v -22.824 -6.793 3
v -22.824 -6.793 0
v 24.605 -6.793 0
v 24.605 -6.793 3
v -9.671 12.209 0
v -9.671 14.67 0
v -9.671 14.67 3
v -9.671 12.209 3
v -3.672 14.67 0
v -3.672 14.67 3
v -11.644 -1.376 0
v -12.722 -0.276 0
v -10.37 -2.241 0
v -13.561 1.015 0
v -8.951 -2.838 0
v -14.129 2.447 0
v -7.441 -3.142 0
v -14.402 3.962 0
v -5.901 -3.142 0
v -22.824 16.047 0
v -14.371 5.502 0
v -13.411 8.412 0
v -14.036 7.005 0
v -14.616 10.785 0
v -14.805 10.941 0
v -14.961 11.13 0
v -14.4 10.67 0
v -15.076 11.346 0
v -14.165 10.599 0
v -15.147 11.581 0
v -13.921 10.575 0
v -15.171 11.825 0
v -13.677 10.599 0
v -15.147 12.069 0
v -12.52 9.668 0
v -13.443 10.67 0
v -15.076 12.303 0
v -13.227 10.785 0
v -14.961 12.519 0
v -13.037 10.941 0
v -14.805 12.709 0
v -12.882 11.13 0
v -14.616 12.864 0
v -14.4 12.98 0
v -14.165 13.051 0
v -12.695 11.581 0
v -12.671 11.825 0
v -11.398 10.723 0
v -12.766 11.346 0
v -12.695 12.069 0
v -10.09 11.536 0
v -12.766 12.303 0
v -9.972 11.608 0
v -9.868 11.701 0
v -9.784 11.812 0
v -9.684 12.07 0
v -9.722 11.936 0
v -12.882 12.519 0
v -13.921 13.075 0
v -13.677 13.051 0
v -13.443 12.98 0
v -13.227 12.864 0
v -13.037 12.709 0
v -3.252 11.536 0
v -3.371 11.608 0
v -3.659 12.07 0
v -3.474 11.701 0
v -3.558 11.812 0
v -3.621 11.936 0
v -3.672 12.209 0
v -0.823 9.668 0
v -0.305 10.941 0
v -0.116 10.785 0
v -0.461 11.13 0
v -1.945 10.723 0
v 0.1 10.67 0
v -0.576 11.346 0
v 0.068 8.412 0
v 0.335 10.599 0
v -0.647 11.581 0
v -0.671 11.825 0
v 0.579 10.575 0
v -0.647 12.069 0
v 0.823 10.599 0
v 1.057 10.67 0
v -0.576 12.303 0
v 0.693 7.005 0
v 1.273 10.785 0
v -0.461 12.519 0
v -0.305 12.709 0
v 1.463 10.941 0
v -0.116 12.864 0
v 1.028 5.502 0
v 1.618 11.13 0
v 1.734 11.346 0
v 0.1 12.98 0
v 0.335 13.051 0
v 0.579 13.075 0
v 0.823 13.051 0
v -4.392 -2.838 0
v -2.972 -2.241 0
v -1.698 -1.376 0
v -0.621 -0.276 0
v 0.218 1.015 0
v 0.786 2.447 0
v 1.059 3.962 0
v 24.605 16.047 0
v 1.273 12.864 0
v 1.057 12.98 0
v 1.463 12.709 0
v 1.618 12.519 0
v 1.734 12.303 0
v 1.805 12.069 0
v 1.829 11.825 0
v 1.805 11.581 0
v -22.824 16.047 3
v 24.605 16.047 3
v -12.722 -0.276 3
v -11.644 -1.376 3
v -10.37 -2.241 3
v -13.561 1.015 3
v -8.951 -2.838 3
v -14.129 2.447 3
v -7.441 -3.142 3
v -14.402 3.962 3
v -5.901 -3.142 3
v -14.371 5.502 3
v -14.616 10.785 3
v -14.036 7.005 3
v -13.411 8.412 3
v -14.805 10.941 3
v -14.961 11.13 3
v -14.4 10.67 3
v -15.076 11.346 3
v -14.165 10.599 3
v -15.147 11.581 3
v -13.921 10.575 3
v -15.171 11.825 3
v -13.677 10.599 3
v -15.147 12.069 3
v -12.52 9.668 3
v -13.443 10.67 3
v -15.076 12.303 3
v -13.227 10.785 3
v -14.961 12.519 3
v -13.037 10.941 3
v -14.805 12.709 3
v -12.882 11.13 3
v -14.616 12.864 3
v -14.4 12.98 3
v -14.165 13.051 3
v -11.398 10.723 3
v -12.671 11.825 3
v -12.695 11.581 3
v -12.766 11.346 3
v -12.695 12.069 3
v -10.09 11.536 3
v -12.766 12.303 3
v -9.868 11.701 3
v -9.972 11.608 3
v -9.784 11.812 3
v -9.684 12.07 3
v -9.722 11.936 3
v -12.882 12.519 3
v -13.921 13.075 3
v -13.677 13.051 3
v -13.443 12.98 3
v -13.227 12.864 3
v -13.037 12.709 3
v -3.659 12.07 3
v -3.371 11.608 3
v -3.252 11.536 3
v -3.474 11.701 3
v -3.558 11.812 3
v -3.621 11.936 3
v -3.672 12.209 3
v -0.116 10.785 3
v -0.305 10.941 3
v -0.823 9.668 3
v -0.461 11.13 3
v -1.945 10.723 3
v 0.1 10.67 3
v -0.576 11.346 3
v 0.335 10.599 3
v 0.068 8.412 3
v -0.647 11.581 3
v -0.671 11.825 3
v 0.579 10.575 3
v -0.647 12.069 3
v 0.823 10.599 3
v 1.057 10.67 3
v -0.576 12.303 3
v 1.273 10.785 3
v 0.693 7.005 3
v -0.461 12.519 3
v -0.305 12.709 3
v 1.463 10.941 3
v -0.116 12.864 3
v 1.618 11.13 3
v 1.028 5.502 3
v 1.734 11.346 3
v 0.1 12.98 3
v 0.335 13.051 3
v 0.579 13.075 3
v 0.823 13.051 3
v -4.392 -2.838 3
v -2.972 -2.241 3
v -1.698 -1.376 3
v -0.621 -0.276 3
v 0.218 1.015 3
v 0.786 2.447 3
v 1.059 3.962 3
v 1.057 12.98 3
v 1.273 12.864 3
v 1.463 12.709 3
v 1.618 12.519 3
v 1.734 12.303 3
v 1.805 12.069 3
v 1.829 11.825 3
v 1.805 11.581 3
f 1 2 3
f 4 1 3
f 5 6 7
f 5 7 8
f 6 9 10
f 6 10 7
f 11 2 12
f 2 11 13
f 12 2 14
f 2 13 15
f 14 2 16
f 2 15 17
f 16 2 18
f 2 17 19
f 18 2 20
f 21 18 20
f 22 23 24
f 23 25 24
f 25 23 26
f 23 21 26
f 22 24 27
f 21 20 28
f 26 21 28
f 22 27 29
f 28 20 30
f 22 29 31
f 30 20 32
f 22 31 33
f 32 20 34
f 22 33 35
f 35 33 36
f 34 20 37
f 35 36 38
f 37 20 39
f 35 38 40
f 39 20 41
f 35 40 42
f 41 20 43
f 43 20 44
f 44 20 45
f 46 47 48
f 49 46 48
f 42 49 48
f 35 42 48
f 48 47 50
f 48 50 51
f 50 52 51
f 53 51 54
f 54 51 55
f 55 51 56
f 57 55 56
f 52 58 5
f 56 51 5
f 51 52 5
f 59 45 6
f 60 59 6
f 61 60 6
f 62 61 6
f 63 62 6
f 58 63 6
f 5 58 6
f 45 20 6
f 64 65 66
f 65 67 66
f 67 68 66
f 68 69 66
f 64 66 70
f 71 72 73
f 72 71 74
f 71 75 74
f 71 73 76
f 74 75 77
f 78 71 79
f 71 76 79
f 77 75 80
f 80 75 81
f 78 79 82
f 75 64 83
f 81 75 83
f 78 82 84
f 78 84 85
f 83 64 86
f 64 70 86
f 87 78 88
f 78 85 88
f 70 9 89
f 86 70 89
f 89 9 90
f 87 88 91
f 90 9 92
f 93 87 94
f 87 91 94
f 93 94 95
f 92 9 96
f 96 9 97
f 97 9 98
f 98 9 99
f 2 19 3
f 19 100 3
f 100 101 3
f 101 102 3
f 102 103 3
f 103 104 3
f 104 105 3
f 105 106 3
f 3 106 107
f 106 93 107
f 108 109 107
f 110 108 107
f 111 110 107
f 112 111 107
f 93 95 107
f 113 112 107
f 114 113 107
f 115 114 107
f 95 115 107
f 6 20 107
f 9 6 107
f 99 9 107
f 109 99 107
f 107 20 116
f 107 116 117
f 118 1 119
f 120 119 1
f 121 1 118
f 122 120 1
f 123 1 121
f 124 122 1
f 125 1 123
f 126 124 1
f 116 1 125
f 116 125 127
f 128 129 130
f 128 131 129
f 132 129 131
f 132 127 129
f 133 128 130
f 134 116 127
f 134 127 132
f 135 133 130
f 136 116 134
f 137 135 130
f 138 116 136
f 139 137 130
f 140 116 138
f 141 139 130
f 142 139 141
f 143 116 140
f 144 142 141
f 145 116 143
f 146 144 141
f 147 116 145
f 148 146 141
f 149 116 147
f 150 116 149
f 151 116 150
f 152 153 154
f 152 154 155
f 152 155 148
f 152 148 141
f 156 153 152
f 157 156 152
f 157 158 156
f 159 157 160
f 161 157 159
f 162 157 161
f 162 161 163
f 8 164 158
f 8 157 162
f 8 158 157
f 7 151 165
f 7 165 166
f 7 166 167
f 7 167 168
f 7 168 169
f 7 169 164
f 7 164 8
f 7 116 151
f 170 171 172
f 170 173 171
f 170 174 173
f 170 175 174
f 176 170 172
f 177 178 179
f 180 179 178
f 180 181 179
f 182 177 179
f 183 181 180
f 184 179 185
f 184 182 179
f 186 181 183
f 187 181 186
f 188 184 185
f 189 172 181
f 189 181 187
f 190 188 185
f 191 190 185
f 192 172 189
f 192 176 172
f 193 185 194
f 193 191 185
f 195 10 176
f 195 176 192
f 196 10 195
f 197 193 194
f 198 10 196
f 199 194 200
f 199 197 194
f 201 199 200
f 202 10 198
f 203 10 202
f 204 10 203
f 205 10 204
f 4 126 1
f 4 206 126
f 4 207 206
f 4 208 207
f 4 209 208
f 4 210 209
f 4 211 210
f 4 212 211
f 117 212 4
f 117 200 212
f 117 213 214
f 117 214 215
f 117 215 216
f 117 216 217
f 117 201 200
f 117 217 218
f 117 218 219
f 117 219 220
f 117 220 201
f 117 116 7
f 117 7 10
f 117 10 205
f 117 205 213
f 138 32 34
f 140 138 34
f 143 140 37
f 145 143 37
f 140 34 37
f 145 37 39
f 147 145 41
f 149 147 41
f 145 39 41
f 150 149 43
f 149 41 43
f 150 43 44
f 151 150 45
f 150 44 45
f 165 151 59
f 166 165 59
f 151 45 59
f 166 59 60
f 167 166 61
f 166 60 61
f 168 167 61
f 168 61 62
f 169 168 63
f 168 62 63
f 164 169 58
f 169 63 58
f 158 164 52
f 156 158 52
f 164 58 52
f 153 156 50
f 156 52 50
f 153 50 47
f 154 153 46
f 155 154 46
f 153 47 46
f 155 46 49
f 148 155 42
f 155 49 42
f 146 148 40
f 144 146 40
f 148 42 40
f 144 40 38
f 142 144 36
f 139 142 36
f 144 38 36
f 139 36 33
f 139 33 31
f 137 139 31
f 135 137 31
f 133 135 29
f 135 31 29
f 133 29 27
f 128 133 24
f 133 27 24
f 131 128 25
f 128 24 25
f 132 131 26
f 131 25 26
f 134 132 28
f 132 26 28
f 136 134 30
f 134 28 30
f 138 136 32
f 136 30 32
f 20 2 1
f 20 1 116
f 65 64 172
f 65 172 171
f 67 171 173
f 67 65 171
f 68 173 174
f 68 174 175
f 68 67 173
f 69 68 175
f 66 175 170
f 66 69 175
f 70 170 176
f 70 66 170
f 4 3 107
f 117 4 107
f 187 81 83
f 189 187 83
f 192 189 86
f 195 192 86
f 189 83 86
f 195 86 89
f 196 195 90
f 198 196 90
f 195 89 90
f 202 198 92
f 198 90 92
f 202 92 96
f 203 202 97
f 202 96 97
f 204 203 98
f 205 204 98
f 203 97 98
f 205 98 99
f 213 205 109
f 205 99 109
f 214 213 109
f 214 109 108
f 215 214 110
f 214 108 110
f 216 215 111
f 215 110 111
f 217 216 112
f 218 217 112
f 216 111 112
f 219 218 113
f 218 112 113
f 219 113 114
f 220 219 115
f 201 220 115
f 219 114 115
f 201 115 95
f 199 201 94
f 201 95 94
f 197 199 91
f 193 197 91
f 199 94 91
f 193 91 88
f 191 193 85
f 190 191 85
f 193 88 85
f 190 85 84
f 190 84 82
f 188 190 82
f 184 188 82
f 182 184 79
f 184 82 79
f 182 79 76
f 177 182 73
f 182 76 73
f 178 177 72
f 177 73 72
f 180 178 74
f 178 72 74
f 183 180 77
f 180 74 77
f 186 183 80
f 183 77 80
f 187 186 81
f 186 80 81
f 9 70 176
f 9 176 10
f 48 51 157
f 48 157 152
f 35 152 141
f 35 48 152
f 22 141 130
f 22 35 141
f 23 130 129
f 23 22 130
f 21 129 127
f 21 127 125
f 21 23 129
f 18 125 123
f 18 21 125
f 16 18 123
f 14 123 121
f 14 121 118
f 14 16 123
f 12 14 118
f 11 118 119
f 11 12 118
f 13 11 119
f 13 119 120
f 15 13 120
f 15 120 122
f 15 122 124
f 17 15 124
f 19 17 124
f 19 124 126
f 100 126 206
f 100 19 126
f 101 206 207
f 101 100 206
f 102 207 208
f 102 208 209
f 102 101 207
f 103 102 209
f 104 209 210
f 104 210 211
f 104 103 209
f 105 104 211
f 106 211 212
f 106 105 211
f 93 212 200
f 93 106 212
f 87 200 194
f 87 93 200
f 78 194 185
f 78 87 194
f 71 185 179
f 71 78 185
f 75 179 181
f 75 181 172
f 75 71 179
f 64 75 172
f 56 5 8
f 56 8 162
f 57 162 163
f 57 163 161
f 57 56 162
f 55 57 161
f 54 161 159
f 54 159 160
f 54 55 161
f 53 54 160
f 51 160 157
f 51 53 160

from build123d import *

# Parameters (mm, degrees)
SKETCH1_W           = 47.429010539
SKETCH1_H           = 22.84
BOSS_EXTRUDE1_DEPTH = 3
SKETCH2_R           = 1.25
CUT_EXTRUDE1_DEPTH  = 3


with BuildPart() as part:
    # Sketch1 → Boss-Extrude1 (new body)
    with BuildSketch(Plane.XY):
        with Locations((0.890297776, 4.627297895)):
            Rectangle(SKETCH1_W, SKETCH1_H)
    extrude(amount=BOSS_EXTRUDE1_DEPTH)

    # Sketch2 → Cut-Extrude1 (cut)
    with BuildSketch(Plane(origin=(0, 0, 0), x_dir=(-1, 0, 0), z_dir=(0, 0, -1))):
        with Locations((-0.578707914, 11.824797895)):
            Circle(SKETCH2_R)
        with Locations((13.921292086, 11.824797895)):
            Circle(SKETCH2_R)
        with BuildLine():
            Line((3.671803832, 14.669797895), (9.67078034, 14.669797895))
            Line((9.67078034, 14.669797895), (9.67078034, 12.208693547))
            ThreePointArc((9.67078034, 12.208693547), (9.784194907, 11.812134615), (10.090137637, 11.535510509))
            ThreePointArc((10.090137637, 11.535510509), (6.671292086, -3.180202105), (3.252446535, 11.535510509))
            ThreePointArc((3.252446535, 11.535510509), (3.558389265, 11.812134615), (3.671803832, 12.208693547))
            Line((3.671803832, 12.208693547), (3.671803832, 14.669797895))
        make_face()
    extrude(amount=-CUT_EXTRUDE1_DEPTH, mode=Mode.SUBTRACT)


solid = part.part
